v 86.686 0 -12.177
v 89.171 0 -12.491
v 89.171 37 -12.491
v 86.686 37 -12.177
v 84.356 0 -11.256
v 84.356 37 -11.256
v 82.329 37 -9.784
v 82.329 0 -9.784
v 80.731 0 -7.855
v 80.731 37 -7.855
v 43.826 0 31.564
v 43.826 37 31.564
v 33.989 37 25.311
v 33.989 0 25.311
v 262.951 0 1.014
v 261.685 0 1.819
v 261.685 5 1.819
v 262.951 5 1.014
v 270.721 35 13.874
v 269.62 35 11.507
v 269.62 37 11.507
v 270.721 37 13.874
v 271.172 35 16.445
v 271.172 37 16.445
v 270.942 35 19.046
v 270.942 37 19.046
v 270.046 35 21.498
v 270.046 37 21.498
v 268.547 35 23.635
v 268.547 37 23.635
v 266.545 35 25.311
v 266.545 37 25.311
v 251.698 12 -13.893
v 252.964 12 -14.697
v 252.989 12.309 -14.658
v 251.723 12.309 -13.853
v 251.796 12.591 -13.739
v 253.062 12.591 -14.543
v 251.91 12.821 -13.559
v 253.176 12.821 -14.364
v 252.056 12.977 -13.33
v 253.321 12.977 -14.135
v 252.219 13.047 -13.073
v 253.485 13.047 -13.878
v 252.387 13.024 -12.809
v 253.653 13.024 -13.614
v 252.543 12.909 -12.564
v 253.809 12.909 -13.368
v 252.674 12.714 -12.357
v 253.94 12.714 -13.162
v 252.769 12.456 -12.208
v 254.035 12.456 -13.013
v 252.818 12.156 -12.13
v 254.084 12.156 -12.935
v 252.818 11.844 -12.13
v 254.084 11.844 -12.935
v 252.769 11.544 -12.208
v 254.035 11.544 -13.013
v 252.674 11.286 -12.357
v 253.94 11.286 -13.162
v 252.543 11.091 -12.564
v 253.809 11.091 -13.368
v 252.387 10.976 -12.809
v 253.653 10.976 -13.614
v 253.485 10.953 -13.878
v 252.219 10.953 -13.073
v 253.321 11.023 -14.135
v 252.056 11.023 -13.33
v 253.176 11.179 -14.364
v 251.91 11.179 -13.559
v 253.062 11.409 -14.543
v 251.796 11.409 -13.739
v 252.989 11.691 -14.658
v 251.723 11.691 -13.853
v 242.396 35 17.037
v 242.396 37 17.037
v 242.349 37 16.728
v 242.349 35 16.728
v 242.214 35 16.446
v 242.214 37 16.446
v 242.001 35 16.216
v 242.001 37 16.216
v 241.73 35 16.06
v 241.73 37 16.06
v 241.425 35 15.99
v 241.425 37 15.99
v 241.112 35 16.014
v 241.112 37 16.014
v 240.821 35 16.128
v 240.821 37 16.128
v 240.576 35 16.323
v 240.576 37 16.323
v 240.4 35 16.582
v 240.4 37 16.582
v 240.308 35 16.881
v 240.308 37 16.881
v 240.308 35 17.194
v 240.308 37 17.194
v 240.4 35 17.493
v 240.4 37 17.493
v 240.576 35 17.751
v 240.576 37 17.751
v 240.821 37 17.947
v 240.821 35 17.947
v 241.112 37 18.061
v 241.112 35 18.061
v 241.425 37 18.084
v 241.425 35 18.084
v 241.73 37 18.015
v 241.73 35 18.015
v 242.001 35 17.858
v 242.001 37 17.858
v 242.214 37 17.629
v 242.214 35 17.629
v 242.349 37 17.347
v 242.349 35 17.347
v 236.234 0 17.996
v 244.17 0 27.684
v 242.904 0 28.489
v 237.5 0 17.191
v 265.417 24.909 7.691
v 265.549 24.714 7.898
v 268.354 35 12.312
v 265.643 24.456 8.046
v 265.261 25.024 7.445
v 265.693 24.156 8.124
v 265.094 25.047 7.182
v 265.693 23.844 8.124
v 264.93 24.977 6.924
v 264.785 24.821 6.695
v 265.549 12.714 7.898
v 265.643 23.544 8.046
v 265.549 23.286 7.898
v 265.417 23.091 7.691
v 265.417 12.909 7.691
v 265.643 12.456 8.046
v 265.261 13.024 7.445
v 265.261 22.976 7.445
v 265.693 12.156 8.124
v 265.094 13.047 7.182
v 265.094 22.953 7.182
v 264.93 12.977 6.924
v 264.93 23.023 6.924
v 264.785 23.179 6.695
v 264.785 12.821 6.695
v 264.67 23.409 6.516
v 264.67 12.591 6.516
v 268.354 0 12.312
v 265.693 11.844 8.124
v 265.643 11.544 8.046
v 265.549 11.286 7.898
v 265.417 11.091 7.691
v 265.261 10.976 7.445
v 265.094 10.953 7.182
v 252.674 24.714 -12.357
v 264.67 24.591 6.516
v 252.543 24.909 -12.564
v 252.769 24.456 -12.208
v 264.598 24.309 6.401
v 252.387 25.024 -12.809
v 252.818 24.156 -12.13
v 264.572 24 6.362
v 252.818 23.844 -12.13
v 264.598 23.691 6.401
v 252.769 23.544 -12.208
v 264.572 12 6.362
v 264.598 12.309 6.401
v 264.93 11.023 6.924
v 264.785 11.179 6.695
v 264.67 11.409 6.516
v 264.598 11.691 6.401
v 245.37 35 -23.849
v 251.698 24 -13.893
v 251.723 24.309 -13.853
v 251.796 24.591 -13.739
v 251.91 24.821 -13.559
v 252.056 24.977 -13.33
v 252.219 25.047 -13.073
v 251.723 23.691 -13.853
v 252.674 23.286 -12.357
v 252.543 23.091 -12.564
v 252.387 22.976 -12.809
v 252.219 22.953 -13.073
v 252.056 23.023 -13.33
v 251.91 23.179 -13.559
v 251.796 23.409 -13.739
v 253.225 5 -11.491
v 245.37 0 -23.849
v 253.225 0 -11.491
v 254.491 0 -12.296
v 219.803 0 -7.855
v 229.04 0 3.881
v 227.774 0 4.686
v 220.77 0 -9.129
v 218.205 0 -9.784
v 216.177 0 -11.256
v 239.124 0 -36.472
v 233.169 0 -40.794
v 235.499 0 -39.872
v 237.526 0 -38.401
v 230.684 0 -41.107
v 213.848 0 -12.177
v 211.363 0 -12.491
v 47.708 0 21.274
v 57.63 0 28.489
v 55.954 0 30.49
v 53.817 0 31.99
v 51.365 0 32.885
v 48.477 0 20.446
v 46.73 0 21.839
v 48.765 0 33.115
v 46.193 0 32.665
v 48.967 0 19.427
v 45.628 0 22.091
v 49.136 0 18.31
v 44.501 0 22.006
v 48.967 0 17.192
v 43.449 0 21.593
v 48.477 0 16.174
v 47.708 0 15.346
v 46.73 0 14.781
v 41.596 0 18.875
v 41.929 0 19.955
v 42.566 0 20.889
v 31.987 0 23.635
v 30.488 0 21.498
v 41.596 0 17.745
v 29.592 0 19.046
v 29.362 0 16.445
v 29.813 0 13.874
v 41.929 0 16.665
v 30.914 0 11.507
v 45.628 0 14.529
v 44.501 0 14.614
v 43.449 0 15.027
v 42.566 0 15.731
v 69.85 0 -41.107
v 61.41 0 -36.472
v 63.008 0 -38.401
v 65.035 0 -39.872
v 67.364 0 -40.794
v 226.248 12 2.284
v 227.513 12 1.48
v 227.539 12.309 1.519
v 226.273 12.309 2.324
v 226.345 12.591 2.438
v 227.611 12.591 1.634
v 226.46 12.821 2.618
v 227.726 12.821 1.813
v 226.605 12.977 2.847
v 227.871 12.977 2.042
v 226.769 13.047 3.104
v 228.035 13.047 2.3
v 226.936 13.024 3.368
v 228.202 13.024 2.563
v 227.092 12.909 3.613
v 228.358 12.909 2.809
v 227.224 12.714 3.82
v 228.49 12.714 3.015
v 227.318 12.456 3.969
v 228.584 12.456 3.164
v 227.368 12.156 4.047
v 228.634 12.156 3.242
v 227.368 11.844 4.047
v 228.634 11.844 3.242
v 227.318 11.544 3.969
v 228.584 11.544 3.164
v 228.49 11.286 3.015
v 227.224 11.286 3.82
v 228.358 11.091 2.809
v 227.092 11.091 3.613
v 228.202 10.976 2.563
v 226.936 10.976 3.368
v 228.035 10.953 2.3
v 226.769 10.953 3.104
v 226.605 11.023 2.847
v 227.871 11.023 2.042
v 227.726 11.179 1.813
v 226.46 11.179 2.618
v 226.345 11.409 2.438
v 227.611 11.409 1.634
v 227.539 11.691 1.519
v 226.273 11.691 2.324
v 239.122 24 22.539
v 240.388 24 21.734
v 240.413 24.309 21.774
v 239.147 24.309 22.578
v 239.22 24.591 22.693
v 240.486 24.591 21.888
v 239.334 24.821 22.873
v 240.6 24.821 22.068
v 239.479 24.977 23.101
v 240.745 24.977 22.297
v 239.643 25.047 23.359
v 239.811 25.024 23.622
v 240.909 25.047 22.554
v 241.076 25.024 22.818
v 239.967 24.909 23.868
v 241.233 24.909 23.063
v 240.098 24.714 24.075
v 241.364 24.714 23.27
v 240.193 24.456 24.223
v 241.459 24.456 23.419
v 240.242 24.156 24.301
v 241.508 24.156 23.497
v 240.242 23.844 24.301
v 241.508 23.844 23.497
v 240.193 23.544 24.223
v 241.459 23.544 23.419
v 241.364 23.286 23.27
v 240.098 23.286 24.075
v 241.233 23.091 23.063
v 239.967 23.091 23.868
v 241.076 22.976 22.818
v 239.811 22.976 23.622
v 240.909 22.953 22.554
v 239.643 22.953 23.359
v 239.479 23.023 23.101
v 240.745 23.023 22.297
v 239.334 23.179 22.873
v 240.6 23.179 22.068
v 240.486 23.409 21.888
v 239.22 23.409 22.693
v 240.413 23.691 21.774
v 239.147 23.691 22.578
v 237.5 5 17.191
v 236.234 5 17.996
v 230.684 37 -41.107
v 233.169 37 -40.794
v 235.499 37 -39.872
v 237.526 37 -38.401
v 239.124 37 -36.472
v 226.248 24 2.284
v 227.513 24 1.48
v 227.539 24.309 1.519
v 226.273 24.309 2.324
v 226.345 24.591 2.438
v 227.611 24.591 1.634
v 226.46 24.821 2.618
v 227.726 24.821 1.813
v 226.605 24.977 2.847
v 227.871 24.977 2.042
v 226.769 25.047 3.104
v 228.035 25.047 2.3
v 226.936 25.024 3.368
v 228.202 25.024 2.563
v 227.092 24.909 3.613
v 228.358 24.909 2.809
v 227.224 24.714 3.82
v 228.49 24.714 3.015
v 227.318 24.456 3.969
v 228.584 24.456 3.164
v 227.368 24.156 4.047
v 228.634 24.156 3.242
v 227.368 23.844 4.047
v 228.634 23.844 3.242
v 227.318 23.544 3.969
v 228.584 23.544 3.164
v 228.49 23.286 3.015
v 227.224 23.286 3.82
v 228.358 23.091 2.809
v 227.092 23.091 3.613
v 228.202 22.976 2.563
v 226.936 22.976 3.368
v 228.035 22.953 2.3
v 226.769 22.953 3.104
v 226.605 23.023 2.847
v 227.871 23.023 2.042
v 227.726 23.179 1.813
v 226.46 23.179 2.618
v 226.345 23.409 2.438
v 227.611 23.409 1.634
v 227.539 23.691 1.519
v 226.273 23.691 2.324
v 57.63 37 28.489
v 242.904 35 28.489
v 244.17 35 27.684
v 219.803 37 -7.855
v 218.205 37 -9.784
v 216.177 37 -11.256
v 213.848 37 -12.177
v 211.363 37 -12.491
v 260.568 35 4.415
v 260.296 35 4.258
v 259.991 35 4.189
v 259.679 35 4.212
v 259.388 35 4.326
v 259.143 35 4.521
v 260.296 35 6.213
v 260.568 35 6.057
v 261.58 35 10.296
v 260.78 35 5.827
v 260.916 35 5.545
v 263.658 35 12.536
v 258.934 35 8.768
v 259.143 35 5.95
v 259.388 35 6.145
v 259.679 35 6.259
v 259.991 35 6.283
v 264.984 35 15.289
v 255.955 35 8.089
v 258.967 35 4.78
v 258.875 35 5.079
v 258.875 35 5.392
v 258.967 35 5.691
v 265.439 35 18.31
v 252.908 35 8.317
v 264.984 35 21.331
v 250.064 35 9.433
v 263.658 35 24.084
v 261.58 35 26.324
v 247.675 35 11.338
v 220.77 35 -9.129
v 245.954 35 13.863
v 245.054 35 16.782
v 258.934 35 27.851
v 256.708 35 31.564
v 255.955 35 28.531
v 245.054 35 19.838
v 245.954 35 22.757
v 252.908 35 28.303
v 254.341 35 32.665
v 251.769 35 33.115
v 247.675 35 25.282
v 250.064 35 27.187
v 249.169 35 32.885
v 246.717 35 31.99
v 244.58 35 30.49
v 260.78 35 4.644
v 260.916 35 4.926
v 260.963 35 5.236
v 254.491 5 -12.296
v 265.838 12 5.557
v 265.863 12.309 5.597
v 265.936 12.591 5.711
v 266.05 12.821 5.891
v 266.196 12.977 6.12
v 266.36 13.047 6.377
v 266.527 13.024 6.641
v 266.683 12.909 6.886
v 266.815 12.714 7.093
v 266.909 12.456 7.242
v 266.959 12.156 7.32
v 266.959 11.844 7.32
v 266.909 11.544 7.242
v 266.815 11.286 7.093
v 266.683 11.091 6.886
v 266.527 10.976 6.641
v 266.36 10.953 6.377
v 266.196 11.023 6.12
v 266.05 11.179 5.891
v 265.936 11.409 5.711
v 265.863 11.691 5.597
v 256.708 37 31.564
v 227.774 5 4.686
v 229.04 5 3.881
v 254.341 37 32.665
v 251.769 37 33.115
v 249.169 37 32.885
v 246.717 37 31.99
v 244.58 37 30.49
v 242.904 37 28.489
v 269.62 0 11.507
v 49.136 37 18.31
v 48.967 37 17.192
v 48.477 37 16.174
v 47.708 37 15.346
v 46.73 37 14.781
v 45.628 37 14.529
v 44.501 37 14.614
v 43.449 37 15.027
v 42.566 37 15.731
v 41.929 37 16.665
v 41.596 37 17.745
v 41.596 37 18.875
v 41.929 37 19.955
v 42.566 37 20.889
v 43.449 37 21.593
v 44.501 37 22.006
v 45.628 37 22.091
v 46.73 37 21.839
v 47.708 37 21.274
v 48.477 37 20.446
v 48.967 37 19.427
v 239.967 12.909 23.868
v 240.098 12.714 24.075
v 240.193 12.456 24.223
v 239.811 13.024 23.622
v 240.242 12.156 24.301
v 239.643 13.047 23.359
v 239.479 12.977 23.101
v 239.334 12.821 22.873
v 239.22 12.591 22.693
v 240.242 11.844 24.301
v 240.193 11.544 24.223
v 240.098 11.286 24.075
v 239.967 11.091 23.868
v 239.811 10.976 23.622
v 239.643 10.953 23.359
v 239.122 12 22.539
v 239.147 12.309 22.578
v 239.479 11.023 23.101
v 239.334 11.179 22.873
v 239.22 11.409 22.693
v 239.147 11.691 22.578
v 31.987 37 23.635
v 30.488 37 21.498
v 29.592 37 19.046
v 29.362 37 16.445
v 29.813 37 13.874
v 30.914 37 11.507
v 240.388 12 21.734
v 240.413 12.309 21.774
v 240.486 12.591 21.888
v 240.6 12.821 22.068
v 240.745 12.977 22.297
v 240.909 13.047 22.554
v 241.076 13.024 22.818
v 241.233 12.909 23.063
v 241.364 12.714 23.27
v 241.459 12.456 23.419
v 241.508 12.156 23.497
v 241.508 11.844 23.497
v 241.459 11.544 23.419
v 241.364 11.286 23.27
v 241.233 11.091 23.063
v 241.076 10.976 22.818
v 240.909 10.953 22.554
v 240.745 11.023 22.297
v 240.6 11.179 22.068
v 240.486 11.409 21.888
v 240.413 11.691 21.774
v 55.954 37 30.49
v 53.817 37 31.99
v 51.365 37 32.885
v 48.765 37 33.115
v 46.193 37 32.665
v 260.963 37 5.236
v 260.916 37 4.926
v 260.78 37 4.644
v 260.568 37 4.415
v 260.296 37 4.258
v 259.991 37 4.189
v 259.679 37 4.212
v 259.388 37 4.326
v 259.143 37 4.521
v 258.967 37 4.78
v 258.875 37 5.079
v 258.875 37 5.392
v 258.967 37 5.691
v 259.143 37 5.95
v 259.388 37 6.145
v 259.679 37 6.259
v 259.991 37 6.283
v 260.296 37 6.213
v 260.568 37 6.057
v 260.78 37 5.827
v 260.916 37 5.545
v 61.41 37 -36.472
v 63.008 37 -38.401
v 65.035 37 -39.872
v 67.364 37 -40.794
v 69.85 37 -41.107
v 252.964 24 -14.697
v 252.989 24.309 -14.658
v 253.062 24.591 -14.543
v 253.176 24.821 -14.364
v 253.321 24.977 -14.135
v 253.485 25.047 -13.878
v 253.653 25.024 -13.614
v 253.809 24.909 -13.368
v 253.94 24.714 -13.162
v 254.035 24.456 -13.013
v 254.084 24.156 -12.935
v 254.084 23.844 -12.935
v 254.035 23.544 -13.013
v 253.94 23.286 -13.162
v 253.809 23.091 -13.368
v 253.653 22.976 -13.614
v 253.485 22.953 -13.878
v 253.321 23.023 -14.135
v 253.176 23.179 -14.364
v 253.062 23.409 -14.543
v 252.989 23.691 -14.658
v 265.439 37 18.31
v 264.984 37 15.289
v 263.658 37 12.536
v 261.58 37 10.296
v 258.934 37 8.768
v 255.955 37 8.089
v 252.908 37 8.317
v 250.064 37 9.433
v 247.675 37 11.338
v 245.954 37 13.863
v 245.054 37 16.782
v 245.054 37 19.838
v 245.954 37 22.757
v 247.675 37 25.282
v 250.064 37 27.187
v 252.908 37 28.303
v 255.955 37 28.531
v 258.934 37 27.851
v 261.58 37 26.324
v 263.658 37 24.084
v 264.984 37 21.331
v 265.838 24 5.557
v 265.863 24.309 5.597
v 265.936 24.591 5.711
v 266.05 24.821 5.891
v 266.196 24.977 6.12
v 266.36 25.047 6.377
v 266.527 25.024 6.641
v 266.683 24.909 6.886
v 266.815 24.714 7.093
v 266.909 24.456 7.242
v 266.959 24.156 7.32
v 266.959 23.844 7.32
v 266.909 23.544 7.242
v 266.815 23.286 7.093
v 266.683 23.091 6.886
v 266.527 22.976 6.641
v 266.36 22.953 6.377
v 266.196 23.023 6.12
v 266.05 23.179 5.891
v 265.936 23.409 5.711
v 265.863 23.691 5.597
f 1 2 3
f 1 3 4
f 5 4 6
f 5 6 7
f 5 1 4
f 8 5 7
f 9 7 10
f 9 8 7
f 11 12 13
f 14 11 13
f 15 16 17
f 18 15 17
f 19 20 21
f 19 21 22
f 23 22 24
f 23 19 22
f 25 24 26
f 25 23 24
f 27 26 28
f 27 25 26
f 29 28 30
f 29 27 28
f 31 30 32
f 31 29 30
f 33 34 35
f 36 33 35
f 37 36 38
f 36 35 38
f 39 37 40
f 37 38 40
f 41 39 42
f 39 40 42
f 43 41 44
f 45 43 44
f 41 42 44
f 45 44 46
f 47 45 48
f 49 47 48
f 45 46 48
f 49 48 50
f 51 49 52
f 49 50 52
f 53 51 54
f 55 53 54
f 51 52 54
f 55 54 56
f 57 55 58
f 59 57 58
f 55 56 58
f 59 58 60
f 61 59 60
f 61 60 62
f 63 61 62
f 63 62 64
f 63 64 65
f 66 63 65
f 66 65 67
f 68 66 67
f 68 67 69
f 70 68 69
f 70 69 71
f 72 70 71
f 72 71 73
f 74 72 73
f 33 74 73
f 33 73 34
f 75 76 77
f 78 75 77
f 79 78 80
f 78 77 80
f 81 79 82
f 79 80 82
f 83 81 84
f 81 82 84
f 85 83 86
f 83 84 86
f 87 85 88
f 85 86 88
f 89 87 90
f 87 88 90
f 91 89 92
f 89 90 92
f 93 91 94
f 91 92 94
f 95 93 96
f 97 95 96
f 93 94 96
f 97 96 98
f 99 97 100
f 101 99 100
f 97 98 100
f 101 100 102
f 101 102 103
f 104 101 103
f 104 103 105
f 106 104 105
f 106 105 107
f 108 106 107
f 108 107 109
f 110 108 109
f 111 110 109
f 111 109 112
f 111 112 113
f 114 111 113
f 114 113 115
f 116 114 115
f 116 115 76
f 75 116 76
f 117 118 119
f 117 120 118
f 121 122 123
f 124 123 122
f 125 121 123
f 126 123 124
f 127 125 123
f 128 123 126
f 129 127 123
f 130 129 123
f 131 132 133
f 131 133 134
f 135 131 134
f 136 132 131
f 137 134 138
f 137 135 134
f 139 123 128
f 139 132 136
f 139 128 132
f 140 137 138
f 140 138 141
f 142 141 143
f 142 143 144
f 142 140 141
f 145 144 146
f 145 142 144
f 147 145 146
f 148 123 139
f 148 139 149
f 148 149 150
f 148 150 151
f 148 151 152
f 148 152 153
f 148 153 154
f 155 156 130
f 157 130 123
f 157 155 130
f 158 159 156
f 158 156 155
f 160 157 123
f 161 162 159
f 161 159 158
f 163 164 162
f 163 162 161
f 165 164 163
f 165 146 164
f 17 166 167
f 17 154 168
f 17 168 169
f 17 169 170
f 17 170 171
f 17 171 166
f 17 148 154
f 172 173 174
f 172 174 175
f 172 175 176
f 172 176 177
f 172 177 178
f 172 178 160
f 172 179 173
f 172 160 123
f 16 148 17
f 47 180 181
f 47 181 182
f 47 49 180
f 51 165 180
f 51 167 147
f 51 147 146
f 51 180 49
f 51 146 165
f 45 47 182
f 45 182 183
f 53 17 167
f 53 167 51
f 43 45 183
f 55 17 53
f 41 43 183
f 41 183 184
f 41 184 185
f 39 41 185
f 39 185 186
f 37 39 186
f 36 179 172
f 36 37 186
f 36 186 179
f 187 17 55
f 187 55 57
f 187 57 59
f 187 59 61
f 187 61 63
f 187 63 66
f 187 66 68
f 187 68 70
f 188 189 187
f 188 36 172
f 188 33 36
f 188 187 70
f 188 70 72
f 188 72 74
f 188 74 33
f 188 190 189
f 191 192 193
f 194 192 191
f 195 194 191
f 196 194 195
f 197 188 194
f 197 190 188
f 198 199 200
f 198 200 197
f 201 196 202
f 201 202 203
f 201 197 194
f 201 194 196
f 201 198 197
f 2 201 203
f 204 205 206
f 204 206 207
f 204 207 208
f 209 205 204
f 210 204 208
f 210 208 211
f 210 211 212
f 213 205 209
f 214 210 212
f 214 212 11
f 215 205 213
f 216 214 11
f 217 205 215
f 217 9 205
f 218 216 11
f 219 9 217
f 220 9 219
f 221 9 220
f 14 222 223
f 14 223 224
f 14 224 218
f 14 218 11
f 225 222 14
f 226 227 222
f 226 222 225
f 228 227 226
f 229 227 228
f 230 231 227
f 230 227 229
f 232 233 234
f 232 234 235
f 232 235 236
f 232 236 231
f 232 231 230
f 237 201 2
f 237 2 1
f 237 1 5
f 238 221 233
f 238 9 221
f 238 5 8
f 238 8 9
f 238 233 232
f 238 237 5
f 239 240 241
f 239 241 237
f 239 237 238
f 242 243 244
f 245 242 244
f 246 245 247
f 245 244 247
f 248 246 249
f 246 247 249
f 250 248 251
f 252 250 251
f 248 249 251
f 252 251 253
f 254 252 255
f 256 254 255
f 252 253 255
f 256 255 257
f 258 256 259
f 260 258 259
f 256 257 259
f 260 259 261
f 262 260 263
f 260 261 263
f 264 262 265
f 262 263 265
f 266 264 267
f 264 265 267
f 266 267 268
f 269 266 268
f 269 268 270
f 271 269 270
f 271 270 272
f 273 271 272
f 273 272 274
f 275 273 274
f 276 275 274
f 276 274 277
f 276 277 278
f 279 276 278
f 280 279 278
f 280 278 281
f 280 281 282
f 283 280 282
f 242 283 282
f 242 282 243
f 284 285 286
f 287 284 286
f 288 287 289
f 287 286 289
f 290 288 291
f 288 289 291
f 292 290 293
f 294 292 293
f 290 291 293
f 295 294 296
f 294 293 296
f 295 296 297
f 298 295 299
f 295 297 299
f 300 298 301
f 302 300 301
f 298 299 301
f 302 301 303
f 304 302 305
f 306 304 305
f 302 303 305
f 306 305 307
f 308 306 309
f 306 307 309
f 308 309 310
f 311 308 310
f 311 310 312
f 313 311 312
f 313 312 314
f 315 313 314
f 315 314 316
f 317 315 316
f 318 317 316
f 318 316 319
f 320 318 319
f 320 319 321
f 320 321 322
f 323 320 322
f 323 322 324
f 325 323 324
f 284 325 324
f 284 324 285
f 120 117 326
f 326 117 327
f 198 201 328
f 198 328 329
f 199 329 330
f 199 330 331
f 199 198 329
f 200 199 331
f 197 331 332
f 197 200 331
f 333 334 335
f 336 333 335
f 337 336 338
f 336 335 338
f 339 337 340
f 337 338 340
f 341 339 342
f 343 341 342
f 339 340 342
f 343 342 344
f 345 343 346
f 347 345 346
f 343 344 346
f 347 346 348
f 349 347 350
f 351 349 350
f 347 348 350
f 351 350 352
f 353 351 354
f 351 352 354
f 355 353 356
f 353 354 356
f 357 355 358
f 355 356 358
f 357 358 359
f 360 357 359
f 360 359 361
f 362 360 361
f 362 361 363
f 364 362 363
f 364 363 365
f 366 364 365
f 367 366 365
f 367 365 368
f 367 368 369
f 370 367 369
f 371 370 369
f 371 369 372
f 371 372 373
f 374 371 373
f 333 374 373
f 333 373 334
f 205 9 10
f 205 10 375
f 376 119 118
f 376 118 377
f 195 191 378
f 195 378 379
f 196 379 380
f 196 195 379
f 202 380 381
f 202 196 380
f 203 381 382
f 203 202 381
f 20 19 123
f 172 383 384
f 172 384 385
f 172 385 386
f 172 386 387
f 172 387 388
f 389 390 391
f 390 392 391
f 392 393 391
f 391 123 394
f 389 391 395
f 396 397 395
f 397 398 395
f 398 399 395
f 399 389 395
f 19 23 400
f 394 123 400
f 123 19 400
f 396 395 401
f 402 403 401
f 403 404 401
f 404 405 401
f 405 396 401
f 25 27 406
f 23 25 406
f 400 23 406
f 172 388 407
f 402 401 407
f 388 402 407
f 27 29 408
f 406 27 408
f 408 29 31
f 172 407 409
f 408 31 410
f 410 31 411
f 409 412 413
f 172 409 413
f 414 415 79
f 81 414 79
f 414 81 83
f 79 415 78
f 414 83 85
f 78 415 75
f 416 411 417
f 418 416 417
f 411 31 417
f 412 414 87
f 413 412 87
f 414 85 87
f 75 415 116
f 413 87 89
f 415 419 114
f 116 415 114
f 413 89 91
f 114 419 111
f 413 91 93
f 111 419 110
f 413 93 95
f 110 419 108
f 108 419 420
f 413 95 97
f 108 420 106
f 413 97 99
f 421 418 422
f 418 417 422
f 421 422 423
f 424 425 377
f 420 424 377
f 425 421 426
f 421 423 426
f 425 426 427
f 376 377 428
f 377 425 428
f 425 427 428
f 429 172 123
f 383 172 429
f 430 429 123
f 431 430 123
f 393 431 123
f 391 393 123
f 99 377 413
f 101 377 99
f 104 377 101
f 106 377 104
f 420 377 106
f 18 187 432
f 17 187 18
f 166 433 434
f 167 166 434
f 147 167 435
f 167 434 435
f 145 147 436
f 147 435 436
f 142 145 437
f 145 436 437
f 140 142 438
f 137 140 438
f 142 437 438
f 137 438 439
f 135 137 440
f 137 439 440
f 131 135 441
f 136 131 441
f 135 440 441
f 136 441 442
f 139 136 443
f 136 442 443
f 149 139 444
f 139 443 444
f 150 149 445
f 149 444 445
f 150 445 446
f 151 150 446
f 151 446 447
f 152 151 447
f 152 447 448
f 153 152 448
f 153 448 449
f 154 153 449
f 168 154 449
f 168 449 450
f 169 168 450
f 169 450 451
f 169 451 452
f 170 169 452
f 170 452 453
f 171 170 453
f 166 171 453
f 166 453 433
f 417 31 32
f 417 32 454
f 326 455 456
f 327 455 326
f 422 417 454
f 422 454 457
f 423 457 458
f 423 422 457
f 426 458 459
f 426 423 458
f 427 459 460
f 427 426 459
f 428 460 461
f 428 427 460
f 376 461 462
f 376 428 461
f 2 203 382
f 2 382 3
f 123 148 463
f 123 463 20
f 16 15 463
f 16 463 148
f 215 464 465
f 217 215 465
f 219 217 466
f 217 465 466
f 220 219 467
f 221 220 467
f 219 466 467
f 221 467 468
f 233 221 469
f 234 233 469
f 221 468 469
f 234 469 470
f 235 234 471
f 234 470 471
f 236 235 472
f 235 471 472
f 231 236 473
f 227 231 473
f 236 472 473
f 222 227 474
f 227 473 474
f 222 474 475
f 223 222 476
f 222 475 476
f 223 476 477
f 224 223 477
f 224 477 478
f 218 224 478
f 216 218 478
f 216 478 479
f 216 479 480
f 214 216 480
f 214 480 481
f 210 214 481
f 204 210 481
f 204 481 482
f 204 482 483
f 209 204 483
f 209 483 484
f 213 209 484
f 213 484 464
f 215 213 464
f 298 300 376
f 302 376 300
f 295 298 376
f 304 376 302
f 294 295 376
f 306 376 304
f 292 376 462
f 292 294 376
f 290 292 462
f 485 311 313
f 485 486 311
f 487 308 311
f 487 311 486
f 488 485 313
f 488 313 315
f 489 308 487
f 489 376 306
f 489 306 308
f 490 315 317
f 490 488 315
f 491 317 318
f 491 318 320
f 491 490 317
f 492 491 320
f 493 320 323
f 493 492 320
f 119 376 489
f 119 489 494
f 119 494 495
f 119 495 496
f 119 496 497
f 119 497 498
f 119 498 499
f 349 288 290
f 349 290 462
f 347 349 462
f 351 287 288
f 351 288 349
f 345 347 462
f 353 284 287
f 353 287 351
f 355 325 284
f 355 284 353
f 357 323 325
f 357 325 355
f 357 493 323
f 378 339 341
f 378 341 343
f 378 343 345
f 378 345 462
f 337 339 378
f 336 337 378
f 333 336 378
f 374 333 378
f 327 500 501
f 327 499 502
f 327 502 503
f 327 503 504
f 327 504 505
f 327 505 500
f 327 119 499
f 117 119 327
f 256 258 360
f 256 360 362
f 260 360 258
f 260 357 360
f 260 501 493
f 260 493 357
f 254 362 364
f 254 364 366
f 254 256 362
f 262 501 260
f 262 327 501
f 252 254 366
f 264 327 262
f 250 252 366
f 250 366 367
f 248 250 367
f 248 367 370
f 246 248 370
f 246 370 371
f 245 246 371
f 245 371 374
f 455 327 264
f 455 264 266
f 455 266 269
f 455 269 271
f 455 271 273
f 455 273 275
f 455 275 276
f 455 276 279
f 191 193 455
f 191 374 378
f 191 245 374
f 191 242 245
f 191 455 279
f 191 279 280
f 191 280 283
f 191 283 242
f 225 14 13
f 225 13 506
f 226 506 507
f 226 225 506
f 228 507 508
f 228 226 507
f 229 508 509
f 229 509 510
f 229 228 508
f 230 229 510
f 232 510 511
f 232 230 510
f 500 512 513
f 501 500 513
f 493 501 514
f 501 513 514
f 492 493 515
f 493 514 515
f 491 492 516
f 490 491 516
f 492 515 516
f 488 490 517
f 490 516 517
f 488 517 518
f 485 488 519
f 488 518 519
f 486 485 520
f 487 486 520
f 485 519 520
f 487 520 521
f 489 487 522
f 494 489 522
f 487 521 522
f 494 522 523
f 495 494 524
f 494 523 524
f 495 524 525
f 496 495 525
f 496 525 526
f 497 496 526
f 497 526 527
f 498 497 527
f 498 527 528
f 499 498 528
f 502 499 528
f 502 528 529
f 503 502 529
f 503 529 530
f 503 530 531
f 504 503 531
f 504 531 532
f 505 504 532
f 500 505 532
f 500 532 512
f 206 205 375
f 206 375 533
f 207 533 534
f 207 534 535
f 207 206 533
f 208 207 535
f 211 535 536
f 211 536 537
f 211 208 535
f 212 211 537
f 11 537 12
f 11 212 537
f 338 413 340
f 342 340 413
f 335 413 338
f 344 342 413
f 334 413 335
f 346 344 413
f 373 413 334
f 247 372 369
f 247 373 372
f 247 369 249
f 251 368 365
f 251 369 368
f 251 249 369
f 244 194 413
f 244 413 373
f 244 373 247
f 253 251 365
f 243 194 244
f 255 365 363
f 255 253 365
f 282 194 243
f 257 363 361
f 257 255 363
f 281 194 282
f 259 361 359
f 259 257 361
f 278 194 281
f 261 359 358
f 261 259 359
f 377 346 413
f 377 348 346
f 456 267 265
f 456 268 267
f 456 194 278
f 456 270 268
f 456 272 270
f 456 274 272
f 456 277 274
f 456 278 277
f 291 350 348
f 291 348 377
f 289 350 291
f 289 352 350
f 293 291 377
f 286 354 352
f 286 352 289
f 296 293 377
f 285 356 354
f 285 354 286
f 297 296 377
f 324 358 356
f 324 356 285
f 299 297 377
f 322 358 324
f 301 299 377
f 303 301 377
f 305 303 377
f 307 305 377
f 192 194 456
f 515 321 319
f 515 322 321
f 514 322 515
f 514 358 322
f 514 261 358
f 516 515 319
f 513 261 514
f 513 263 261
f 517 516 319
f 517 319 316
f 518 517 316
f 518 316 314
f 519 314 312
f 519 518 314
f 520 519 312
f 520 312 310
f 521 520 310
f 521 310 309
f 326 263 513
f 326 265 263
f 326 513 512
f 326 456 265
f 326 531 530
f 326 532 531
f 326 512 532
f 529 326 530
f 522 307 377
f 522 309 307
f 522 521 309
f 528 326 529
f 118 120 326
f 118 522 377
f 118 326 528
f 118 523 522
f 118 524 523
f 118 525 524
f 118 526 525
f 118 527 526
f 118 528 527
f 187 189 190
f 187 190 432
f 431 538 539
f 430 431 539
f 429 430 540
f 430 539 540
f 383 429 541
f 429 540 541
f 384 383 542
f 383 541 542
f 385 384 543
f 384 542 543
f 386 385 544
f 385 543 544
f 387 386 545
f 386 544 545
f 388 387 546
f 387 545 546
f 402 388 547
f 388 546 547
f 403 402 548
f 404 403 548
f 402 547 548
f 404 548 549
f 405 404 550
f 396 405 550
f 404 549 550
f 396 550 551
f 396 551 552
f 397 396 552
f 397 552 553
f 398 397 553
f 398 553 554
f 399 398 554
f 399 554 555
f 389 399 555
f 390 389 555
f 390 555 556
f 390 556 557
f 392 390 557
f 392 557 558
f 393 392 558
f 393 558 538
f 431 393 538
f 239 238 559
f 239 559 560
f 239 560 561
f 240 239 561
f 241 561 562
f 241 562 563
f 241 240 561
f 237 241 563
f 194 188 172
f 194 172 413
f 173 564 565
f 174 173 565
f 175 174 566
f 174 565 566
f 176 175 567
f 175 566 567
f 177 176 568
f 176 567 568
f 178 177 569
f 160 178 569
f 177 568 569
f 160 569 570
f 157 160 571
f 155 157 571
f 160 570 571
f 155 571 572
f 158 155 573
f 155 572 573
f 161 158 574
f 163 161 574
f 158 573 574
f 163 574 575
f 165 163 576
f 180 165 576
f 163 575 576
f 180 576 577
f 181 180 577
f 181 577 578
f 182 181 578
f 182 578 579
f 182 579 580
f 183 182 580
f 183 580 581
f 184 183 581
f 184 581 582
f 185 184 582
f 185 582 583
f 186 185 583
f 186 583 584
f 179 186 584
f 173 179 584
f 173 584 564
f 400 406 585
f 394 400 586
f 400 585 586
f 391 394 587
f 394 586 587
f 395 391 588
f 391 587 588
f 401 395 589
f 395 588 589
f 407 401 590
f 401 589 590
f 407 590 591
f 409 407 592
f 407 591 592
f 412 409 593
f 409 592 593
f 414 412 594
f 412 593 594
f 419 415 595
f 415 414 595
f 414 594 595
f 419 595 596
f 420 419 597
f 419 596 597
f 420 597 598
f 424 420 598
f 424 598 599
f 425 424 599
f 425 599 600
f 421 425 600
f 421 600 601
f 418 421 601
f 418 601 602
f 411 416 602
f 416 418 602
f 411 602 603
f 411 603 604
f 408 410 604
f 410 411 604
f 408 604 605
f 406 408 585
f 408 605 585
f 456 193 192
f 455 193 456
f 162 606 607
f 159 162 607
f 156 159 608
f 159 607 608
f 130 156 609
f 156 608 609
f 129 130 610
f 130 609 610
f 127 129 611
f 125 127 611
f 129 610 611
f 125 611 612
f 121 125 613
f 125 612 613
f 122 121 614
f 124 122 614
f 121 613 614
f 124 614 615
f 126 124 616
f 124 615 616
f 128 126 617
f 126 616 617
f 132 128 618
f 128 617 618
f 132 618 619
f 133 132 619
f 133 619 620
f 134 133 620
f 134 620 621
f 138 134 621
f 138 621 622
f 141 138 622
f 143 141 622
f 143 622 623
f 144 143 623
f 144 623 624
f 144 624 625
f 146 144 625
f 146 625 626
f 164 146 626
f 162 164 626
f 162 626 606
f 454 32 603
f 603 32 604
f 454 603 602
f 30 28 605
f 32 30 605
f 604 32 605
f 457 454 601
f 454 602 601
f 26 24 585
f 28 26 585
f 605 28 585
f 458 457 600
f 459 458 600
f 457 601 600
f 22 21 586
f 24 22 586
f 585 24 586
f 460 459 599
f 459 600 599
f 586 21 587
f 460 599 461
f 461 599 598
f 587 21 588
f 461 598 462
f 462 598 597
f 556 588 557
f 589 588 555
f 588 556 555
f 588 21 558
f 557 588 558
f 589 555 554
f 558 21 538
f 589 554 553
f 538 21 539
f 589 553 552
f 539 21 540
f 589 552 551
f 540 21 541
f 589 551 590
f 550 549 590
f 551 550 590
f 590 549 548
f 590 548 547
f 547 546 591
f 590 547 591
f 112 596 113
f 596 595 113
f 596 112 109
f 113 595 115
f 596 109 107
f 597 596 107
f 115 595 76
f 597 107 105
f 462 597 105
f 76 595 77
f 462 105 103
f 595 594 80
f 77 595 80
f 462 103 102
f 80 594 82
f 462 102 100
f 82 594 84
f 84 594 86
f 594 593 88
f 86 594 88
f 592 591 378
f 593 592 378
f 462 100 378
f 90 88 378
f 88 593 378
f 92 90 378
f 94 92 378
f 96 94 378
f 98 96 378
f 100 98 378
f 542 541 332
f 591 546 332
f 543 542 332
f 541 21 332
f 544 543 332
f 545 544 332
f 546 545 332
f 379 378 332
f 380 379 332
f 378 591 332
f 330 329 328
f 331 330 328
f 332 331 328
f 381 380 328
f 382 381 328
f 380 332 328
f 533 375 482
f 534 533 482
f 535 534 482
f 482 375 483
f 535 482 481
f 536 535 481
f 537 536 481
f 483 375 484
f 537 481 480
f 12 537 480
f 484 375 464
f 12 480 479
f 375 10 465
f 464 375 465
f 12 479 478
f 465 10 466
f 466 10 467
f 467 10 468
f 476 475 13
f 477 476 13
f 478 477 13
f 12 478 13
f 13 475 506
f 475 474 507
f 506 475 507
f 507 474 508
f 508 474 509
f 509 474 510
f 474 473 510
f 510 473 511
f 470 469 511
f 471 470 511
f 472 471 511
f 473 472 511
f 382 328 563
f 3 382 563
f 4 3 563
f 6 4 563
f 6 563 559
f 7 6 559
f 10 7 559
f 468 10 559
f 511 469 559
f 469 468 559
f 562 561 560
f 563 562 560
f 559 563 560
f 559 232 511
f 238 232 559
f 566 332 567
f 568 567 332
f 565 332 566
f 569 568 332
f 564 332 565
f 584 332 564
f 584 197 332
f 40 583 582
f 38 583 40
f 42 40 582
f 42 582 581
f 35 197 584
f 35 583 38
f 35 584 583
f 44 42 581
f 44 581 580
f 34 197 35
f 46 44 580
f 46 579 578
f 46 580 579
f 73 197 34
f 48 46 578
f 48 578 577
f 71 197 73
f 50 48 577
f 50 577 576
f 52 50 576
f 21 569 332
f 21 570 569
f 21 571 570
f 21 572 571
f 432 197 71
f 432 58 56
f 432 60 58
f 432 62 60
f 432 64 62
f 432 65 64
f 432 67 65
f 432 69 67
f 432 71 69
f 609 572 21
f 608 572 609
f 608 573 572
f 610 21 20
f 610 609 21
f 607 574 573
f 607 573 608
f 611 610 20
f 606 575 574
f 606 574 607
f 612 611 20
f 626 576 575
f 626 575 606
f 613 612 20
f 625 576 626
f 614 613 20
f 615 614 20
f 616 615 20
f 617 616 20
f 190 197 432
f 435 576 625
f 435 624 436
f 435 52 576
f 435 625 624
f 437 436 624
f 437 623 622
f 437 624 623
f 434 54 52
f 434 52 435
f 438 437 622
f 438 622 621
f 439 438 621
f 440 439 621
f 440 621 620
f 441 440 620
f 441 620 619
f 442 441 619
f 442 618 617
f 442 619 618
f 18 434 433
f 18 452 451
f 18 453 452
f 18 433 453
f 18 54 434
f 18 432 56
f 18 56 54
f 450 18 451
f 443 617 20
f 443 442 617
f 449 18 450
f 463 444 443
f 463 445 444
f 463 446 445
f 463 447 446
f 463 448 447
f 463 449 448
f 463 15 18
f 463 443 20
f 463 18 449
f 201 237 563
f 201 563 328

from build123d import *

# Parameters (mm, degrees)
BOSS_EXTRUDE1_DEPTH = 37
SKETCH3_R           = 10.25
SKETCH3_R_2         = 1.05
SKETCH3_R_3         = 3.79119947
CUT_EXTRUDE1_DEPTH  = 38
CUT_EXTRUDE5_DEPTH  = 35
SKETCH10_R          = 1.05
CUT_EXTRUDE6_DEPTH  = 35
SKETCH15_W          = 15.770937014
SKETCH15_H          = 5.000421699
CUT_EXTRUDE8_DEPTH  = 35
SKETCH17_W          = 10.43544962
SKETCH17_H          = 35
CUT_EXTRUDE10_DEPTH = 38


with BuildPart() as part:
    # Sketch1 → Boss-Extrude1 (new body)
    with BuildSketch(Plane(origin=(0, 0, 0), x_dir=(1, 0, 0), z_dir=(0, 1, 0))):
        with BuildLine():
            Line((30.91362152, -11.506988518), (61.410209359, 36.471719739))
            ThreePointArc((61.410209359, 36.471719739), (65.035248289, 39.872184028), (69.84963689, 41.10738726))
            Line((69.84963689, 41.10738726), (230.684249594, 41.10738726))
            ThreePointArc((230.684249594, 41.10738726), (235.498638195, 39.872184028), (239.123677125, 36.471719739))
            Line((239.123677125, 36.471719739), (269.620264964, -11.506988518))
            ThreePointArc((269.620264964, -11.506988518), (270.941569742, -19.045741561), (266.545169913, -25.310748528))
            Line((266.545169913, -25.310748528), (256.707586966, -31.563787081))
            ThreePointArc((256.707586966, -31.563787081), (249.168833923, -32.885091859), (242.903826956, -28.488692029))
            Line((242.903826956, -28.488692029), (219.802518103, 7.855405338))
            ThreePointArc((219.802518103, 7.855405338), (216.177479173, 11.255869627), (211.363090572, 12.491072858))
            Line((211.363090572, 12.491072858), (89.170795912, 12.491072858))
            ThreePointArc((89.170795912, 12.491072858), (84.356407311, 11.255869627), (80.731368381, 7.855405338))
            Line((80.731368381, 7.855405338), (57.630059528, -28.488692029))
            ThreePointArc((57.630059528, -28.488692029), (51.365052561, -32.885091859), (43.826299518, -31.563787081))
            Line((43.826299518, -31.563787081), (33.988716571, -25.310748528))
            ThreePointArc((33.988716571, -25.310748528), (29.592316741, -19.045741561), (30.91362152, -11.506988518))
        make_face()
    extrude(amount=BOSS_EXTRUDE1_DEPTH)

    # Sketch3 → Cut-Extrude1 (cut, through all)
    with BuildSketch(Plane(origin=(0, 37, 0), x_dir=(1, 0, 0), z_dir=(0, 1, 0))):
        with Locations((255.189179464, -18.309954767)):
            Circle(SKETCH3_R)
        with Locations((259.912867141, -5.235675639)):
            Circle(SKETCH3_R_2)
        with Locations((241.346126573, -17.037207093)):
            Circle(SKETCH3_R_2)
        with Locations((45.34470702, -18.309954767)):
            Circle(SKETCH3_R_3)
    extrude(amount=-CUT_EXTRUDE1_DEPTH, mode=Mode.SUBTRACT)

    # Sketch9 → Cut-Extrude5 (cut)
    with BuildSketch(Plane.XZ):
        Polygon((220.770453038, -9.128850504), (250.101424494, 37.016053635), (274.286034243, 21.643649867), (245.369620358, -23.849052233), align=None)
    extrude(amount=-CUT_EXTRUDE5_DEPTH, mode=Mode.SUBTRACT)

    # Sketch10 → Cut-Extrude6 (cut)
    with BuildSketch(Plane(origin=(186.824736014, 0, -118.750945563), x_dir=(-0.536433248, 0, -0.843942753), z_dir=(0.843942753, 0, -0.536433248))):
        with Locations((-148.344514011, 24)):
            Circle(SKETCH10_R)
        with Locations((-148.344514011, 12)):
            Circle(SKETCH10_R)
        with Locations((-124.344514011, 12)):
            Circle(SKETCH10_R)
        with Locations((-124.344514011, 24)):
            Circle(SKETCH10_R)
    extrude(amount=-CUT_EXTRUDE6_DEPTH, mode=Mode.SUBTRACT)

    # Sketch15 → Cut-Extrude8 (cut)
    with BuildSketch(Plane(origin=(160.108298005, 0, -101.769242052), x_dir=(0.536433248, 0, 0.843942753), z_dir=(-0.843942753, 0, 0.536433248))):
        with Locations((134.025974507, 2.50021085)):
            Rectangle(SKETCH15_W, SKETCH15_H)
    extrude(amount=-CUT_EXTRUDE8_DEPTH, mode=Mode.SUBTRACT)

    # Sketch17 → Cut-Extrude10 (cut)
    with BuildSketch(Plane(origin=(160.108298005, 0, -101.769242052), x_dir=(0.536433248, 0, 0.843942753), z_dir=(-0.843942753, 0, 0.536433248))):
        with Locations((159.562238821, 17.5)):
            Rectangle(SKETCH17_W, SKETCH17_H)
    extrude(amount=-CUT_EXTRUDE10_DEPTH, mode=Mode.SUBTRACT)


solid = part.part
